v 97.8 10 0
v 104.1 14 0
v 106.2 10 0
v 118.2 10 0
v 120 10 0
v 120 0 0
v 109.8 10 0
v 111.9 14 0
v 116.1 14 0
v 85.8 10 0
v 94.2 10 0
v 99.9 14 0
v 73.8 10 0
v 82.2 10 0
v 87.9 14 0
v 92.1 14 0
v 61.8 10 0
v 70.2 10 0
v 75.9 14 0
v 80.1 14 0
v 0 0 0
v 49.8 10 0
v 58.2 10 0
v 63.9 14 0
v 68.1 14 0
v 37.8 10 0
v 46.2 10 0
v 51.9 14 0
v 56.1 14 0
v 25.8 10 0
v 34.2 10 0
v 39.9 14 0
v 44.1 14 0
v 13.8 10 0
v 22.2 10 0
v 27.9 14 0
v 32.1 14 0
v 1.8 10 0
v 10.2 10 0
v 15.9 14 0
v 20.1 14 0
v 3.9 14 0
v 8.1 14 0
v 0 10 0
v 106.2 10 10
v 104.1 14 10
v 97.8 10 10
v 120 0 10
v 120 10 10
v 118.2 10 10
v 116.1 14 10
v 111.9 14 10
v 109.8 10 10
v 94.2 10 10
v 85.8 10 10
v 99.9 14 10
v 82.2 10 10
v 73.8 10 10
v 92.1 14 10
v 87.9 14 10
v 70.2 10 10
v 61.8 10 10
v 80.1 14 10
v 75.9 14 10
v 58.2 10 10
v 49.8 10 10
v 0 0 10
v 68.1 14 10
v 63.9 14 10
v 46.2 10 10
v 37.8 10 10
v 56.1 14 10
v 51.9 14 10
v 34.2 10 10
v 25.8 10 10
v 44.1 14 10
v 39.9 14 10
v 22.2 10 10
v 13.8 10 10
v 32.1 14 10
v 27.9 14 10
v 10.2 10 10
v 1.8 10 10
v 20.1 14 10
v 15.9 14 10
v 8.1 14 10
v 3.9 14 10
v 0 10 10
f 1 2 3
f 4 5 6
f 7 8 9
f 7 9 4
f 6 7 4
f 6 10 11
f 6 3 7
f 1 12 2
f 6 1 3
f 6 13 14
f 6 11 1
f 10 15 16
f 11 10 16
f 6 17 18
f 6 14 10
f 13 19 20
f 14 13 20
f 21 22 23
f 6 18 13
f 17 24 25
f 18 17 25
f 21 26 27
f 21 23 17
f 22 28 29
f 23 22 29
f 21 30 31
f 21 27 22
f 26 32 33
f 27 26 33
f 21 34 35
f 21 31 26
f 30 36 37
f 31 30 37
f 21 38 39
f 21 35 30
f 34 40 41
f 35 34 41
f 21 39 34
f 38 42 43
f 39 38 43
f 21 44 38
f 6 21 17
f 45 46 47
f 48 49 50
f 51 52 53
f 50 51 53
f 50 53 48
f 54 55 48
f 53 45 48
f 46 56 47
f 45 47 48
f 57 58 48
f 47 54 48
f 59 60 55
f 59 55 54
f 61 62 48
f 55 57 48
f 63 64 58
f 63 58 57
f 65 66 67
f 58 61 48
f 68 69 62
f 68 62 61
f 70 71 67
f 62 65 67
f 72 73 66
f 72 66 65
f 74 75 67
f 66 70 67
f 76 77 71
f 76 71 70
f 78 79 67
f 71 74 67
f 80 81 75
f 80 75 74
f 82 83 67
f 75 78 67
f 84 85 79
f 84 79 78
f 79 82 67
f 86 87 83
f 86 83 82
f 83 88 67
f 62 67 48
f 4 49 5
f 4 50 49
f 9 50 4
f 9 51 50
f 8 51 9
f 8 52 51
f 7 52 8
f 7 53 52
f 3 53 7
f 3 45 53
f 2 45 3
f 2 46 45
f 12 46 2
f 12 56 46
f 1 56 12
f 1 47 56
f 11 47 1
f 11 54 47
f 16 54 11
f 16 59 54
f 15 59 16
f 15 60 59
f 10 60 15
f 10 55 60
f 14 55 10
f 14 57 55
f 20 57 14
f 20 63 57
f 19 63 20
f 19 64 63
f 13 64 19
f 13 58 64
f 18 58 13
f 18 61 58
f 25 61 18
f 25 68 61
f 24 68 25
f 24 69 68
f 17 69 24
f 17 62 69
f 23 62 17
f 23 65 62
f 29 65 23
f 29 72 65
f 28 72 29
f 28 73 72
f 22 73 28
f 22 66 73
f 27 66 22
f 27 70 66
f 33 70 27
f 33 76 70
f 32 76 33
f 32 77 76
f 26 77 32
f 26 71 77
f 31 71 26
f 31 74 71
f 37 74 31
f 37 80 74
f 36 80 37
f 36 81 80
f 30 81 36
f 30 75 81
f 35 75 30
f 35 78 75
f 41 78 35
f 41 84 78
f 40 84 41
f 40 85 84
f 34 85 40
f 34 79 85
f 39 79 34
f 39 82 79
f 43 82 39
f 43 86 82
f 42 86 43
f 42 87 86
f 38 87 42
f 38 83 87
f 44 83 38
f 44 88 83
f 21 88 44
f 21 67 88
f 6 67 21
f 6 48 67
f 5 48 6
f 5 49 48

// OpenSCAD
$fn = 32;

// ----------------------------------------------------------------------
// Gear rack: 10 teeth, pitch 12 mm
// ----------------------------------------------------------------------

// --- parameters (mm) ---
teeth = 10;               // number of teeth
pitch = 12;               // tooth pitch, X
root_w = 8.4;             // tooth width at the root
tip_w = 4.2;              // tooth width at the tip
base_h = 10;              // rack body height, Y
tooth_h = 4;              // tooth height above the body
plate_t = 10;             // rack width, Z (extrusion height)

rack_l = teeth * pitch;  // overall length
total_h = base_h + tooth_h;  // overall height

profile = [[0, 0], [120, 0], [120, 10], [118.2, 10], [116.1, 14], [111.9, 14], [109.8, 10], [106.2, 10], [104.1, 14], [99.9, 14], [97.8, 10], [94.2, 10], [92.1, 14], [87.9, 14], [85.8, 10], [82.2, 10], [80.1, 14], [75.9, 14], [73.8, 10], [70.2, 10], [68.1, 14], [63.9, 14], [61.8, 10], [58.2, 10], [56.1, 14], [51.9, 14], [49.8, 10], [46.2, 10], [44.1, 14], [39.9, 14], [37.8, 10], [34.2, 10], [32.1, 14], [27.9, 14], [25.8, 10], [22.2, 10], [20.1, 14], [15.9, 14], [13.8, 10], [10.2, 10], [8.1, 14], [3.9, 14], [1.8, 10], [0, 10]];  // primary outline, 44 points, counter clockwise

// --- the one profile operation ---
linear_extrude(height = plate_t) polygon(points = profile);
